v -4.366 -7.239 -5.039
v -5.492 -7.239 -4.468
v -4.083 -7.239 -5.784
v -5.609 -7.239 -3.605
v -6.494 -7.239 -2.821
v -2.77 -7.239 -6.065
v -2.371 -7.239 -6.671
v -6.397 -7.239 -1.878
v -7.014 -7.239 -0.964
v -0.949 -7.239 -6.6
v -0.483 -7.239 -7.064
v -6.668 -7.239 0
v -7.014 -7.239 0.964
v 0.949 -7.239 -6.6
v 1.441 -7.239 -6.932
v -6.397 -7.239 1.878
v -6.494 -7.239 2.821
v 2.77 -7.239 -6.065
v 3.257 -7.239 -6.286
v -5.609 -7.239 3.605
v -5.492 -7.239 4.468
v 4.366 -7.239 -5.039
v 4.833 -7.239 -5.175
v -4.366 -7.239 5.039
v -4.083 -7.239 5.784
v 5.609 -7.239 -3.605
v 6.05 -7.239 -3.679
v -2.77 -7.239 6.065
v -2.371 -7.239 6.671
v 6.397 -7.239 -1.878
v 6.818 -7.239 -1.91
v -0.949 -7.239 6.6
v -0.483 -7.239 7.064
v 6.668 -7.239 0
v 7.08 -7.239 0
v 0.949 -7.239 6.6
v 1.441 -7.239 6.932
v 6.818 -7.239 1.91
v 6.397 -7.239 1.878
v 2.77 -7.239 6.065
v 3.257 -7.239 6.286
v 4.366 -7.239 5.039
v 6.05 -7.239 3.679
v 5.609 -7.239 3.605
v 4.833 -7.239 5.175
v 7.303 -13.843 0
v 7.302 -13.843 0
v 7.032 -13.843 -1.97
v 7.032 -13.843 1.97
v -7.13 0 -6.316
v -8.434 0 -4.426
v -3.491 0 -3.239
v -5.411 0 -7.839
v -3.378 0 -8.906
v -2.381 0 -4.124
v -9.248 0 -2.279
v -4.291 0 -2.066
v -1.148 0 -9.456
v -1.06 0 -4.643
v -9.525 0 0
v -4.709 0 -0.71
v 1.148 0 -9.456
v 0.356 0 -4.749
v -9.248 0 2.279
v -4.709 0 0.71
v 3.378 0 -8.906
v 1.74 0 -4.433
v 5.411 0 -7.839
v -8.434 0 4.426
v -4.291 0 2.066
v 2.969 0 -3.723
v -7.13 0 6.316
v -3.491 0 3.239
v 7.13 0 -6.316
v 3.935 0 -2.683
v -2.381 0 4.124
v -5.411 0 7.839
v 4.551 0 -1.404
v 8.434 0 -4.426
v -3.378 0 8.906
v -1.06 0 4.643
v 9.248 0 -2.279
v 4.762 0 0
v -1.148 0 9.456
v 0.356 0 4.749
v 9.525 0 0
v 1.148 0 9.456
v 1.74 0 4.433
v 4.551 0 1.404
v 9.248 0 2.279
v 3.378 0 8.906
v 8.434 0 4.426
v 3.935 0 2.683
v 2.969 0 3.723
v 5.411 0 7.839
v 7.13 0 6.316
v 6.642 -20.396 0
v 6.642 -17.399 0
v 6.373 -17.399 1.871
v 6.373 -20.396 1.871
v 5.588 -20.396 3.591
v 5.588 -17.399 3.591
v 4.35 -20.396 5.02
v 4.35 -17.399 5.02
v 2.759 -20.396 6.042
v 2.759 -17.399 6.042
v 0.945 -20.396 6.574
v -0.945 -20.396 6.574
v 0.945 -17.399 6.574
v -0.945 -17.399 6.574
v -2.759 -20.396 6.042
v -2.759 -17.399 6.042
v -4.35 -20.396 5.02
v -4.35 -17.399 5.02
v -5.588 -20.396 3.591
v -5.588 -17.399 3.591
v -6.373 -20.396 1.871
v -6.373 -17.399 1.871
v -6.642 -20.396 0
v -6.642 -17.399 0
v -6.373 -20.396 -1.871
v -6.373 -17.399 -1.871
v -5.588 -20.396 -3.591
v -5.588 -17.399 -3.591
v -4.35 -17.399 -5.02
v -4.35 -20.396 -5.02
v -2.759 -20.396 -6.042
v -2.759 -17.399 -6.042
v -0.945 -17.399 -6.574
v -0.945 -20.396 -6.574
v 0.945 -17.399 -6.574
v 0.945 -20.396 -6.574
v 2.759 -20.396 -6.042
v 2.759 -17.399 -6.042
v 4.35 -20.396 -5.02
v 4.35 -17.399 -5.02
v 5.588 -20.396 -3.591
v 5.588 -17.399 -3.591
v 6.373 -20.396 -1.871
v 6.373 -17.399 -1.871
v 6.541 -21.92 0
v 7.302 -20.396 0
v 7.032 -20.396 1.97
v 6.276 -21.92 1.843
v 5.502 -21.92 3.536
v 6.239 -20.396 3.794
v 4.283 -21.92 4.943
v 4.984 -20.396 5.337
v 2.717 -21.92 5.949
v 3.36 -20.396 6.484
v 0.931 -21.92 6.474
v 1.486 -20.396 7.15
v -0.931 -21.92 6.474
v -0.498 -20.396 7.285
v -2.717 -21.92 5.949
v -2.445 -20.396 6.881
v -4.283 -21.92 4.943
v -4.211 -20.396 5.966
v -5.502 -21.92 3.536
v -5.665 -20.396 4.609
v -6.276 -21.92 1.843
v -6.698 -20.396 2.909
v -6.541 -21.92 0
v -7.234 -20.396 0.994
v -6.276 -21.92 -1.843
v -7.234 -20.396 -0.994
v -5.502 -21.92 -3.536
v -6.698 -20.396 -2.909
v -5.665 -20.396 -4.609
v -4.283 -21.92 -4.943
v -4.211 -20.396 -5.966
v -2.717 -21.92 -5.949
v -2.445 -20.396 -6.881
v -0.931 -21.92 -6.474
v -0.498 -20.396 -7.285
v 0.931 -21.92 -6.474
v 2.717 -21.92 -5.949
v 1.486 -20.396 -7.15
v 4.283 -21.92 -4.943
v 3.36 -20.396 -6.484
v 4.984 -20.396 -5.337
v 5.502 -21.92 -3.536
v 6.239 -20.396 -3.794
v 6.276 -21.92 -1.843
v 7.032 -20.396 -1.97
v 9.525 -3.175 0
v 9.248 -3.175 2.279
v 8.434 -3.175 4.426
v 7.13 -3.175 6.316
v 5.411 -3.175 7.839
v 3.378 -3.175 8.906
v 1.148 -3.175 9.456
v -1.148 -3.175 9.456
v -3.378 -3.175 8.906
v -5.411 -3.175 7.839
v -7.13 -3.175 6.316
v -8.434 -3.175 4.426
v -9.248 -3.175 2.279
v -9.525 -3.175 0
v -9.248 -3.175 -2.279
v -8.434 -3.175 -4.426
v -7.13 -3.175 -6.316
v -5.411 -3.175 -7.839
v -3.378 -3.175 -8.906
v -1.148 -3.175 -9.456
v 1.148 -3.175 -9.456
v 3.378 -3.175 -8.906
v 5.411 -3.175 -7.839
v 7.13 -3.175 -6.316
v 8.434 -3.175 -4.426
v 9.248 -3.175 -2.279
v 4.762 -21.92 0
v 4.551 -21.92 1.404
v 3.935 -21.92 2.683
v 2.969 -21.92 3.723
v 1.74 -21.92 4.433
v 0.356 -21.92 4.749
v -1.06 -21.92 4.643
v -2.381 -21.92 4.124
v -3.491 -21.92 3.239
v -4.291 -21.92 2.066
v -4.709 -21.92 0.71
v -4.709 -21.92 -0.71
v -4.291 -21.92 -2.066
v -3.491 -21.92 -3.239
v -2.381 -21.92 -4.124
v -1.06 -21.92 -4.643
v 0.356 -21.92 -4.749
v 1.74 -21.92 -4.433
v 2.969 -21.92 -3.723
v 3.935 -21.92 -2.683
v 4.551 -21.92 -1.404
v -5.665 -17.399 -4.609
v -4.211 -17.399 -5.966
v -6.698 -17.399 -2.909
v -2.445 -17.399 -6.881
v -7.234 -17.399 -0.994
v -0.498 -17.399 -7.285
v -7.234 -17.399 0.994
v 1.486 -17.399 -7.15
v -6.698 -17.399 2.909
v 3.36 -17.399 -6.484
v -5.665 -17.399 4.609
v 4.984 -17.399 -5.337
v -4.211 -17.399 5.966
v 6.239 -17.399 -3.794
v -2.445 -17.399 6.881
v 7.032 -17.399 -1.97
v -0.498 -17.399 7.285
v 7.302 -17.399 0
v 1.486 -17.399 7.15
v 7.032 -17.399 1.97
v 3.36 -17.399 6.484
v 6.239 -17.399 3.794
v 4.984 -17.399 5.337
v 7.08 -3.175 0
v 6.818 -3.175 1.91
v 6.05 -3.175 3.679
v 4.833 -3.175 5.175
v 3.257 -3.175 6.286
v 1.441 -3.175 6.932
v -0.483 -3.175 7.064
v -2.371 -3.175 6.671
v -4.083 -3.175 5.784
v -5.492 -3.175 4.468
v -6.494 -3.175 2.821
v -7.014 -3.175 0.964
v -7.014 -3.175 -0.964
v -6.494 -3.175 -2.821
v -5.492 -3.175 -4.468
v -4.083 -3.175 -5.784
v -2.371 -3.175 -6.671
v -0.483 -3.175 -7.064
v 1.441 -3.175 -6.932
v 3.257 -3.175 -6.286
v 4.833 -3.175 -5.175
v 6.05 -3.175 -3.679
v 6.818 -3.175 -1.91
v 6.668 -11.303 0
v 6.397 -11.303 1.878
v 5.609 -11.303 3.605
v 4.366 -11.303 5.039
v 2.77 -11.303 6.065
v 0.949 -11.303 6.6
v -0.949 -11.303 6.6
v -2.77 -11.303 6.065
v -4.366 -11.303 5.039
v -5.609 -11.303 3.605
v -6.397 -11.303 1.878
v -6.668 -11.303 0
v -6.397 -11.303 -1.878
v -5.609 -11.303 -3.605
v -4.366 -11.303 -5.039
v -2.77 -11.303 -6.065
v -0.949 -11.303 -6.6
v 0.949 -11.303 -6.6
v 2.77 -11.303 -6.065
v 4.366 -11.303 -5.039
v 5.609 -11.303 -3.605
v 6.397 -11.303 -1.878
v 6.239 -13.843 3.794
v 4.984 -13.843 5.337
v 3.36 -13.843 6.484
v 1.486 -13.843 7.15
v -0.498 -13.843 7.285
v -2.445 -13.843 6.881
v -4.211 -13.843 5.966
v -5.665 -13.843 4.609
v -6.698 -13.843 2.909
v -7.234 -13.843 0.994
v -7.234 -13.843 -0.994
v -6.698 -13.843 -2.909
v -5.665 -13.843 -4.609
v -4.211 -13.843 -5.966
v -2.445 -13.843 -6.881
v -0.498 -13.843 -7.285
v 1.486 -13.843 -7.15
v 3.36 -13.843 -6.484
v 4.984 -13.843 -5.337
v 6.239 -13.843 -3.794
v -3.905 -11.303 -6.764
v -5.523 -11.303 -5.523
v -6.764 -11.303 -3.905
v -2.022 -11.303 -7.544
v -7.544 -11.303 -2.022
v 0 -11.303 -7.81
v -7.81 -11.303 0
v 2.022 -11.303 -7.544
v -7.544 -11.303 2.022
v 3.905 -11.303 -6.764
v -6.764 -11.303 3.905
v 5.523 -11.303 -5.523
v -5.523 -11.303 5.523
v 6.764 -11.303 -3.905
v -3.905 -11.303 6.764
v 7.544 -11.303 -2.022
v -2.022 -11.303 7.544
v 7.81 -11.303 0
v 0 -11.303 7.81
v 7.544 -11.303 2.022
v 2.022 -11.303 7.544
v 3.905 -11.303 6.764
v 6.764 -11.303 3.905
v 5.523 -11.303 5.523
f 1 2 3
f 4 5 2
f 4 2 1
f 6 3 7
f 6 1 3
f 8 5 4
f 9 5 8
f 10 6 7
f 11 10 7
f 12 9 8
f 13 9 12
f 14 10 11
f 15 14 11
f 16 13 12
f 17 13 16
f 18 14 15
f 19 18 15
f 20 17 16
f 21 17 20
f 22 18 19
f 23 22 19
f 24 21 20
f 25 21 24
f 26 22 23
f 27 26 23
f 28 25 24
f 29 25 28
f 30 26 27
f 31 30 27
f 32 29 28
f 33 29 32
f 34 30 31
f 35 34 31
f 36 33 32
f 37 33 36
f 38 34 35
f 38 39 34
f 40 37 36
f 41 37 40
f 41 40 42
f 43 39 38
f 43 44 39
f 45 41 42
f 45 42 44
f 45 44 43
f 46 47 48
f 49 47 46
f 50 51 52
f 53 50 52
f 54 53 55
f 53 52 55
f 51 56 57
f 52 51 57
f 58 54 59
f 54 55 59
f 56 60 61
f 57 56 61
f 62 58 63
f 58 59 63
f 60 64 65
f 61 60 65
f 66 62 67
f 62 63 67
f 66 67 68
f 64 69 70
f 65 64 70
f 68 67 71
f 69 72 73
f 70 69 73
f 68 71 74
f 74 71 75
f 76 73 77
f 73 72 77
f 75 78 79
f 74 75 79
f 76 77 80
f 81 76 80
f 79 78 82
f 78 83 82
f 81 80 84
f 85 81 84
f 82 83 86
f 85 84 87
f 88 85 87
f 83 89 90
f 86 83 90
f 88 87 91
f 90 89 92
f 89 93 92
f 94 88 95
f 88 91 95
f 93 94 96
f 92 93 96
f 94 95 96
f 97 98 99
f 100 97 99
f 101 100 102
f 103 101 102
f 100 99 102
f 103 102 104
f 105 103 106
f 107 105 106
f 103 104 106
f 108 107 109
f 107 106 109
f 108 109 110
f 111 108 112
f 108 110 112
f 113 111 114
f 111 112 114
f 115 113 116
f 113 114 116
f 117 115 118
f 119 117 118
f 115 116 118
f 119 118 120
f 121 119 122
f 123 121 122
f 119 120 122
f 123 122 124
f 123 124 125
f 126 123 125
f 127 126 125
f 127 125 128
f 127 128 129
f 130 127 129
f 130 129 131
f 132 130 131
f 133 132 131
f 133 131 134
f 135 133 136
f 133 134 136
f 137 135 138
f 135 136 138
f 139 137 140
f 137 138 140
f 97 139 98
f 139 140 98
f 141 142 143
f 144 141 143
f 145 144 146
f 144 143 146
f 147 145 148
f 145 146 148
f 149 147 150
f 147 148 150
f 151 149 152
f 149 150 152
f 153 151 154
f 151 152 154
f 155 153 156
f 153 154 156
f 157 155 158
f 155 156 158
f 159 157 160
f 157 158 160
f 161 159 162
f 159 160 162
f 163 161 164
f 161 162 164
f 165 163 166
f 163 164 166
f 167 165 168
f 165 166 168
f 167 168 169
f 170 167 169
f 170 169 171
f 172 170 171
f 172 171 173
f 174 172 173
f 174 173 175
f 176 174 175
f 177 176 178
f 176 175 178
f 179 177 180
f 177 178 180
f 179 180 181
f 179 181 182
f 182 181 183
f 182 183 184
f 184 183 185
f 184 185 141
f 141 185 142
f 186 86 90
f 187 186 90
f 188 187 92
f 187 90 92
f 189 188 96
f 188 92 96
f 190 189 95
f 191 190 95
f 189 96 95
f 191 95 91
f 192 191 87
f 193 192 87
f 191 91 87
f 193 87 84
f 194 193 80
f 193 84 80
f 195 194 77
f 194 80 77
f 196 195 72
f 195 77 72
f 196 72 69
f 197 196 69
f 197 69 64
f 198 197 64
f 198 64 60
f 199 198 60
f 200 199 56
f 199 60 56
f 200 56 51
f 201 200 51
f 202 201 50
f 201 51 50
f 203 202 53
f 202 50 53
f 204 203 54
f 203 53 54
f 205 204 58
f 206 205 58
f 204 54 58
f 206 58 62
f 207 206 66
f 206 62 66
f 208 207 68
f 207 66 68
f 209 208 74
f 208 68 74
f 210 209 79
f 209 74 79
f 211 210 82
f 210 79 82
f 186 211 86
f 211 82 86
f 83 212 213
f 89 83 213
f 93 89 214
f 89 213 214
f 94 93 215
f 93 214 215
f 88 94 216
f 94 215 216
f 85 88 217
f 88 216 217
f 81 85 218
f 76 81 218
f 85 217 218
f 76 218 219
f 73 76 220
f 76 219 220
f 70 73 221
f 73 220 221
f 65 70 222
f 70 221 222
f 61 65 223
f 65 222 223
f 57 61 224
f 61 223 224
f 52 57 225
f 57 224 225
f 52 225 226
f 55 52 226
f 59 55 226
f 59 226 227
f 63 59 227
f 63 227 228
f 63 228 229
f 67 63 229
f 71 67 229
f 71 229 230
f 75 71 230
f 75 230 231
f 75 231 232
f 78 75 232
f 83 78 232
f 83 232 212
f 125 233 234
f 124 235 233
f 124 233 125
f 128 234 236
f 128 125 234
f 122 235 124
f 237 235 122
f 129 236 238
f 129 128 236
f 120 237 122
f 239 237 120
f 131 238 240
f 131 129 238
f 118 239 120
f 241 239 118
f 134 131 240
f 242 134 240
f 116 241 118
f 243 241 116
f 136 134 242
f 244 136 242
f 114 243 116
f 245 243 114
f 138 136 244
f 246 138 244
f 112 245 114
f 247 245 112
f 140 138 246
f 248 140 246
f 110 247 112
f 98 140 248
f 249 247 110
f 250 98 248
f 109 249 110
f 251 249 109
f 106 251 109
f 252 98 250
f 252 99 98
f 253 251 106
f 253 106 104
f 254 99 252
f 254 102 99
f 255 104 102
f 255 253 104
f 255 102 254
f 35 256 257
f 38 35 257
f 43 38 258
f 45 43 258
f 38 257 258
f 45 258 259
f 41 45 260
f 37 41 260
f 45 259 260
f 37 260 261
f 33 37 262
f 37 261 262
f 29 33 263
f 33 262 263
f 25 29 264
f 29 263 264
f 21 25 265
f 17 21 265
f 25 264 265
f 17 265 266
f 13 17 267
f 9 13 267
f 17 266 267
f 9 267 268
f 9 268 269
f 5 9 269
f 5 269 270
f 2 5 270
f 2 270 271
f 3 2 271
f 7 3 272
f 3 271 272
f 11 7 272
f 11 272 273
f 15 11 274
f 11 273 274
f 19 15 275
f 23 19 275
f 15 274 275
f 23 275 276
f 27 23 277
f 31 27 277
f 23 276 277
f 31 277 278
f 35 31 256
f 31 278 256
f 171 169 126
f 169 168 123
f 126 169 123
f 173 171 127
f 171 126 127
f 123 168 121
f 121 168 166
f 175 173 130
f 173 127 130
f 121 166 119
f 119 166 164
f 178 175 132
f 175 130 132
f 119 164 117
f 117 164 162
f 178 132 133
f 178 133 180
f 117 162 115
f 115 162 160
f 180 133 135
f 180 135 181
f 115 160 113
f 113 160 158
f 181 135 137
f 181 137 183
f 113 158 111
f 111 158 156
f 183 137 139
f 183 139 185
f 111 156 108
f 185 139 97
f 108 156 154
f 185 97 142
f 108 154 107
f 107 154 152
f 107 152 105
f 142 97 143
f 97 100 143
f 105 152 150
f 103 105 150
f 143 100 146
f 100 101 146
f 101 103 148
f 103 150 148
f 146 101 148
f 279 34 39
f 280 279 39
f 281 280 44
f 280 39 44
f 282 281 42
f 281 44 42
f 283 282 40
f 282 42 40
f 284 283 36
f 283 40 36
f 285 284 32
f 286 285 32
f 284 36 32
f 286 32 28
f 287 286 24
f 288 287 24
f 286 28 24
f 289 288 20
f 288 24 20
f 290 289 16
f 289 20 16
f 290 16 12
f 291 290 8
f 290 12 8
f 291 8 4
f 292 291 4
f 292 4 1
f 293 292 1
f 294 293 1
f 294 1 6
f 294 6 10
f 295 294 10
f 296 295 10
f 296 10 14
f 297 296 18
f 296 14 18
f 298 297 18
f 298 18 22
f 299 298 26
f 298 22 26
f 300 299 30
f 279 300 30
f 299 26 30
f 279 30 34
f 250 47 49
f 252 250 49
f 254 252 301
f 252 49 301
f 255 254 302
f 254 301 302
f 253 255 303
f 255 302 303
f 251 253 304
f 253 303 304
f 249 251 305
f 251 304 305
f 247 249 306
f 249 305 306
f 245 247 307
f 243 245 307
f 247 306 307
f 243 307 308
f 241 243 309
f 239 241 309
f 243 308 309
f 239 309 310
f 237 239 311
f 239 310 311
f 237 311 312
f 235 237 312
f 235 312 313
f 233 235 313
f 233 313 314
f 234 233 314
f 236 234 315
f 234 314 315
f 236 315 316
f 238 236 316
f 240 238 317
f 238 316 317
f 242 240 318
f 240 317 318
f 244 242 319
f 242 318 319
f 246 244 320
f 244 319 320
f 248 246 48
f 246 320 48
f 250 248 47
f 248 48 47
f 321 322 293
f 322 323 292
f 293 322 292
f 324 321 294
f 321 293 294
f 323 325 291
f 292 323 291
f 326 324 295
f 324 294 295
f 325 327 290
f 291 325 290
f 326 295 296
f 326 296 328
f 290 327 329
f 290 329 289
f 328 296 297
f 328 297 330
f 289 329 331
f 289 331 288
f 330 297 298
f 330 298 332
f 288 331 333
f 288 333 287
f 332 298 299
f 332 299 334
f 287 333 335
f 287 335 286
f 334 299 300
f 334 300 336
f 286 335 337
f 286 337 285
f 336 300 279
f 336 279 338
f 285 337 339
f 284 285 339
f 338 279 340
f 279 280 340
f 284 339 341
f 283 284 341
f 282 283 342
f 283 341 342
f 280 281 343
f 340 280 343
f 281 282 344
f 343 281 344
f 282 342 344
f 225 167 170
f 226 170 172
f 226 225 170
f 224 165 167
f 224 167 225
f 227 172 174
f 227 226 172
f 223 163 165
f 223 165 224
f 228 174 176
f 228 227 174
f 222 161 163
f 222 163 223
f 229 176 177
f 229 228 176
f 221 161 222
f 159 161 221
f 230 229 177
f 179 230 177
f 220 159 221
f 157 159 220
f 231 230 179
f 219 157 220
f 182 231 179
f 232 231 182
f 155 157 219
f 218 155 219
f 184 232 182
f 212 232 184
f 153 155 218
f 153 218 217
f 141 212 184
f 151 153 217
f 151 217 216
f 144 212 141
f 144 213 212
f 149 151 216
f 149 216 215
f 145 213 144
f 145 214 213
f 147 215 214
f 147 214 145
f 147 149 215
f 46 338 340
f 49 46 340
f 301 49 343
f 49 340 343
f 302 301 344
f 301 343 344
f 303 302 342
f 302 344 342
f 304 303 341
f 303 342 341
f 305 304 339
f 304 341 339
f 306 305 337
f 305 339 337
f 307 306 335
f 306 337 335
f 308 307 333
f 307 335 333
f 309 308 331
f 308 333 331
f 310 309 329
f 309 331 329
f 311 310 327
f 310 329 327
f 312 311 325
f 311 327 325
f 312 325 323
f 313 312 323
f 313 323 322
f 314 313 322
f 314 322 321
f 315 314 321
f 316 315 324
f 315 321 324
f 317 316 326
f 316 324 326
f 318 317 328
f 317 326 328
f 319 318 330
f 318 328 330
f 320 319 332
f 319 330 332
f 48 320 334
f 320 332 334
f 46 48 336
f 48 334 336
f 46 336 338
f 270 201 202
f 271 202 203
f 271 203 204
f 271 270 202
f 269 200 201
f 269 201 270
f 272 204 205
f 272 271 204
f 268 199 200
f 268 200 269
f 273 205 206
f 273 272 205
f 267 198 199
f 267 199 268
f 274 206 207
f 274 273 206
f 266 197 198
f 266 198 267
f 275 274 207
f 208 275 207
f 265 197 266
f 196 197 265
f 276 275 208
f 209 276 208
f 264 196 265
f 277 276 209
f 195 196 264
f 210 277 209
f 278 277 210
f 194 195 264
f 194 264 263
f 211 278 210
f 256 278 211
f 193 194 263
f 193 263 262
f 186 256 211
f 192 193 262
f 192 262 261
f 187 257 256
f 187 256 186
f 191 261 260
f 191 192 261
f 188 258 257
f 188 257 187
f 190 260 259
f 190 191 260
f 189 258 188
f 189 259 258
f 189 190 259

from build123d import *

# Parameters (mm, degrees)
F0_R      = 9.525
F1_DEPTH  = 3.175
F2_R      = 7.08025
F3_DEPTH  = 4.064
F4_R      = 6.6675
F5_DEPTH  = 4.064
F6_R      = 7.8105
F7_DEPTH  = 2.54
F8_R      = 7.3025
F9_DEPTH  = 3.556
F10_R     = 6.6421
F11_DEPTH = 2.9972
F12_R     = 7.3025
F13_DEPTH = 1.524
F14_SIZE2 = 2.53999
F14_SIZE  = 0.50799
F15_SIZE2 = 1.52399
F15_SIZE  = 0.76199
F16_R     = 4.7625
F17_DEPTH = 21.9212


# Not quite as in the source:
# - a fillet or chamfer is up to 0.001 mm smaller than in the source, because OpenCascade refuses the exact size


with BuildPart() as f1:
    # F0 (on Front) → F1 (new body)
    with BuildSketch(Plane.XZ):
        Circle(F0_R)
    extrude(amount=F1_DEPTH)

    # F2 (on face) → F3 (join)
    with BuildSketch(Plane.XZ.offset(3.175)):
        Circle(F2_R)
    extrude(amount=F3_DEPTH)

    # F4 (on face) → F5 (join)
    with BuildSketch(Plane.XZ.offset(7.239)):
        Circle(F4_R)
    extrude(amount=F5_DEPTH)

    # F6 (on face) → F7 (join)
    with BuildSketch(Plane.XZ.offset(11.303)):
        Circle(F6_R)
    extrude(amount=F7_DEPTH)

    # F8 (on face) → F9 (join)
    with BuildSketch(Plane.XZ.offset(13.843)):
        Circle(F8_R)
    extrude(amount=F9_DEPTH)

    # F10 (on face) → F11 (join)
    with BuildSketch(Plane.XZ.offset(17.399)):
        Circle(F10_R)
    extrude(amount=F11_DEPTH)

    # F12 (on face) → F13 (join)
    with BuildSketch(Plane.XZ.offset(20.3962)):
        Circle(F12_R)
    extrude(amount=F13_DEPTH)

    # F14 (size 0.508 and 2.54 in the source; OpenCascade refuses exactly that, so slightly less here)
    f14_edges = [f1.edges().sort_by_distance(p)[0] for p in [
        (-7.8105, -13.843, 0),
    ]]
    f14_side = f1.faces().sort_by_distance((-7.589586, -13.843, 0))[0]
    chamfer(f14_edges, length=F14_SIZE, length2=F14_SIZE2, reference=f14_side)

    # F15 (size 0.762 and 1.524 in the source; OpenCascade refuses exactly that, so slightly less here)
    f15_edges = [f1.edges().sort_by_distance(p)[0] for p in [
        (-7.3025, -21.9202, 0),
    ]]
    f15_side = f1.faces().sort_by_distance((0, -21.9202, 0))[0]
    chamfer(f15_edges, length=F15_SIZE, length2=F15_SIZE2, reference=f15_side)

    # F16 (on face) → F17 (cut, through all)
    with BuildSketch(Plane.XZ.offset(21.9202)):
        Circle(F16_R)
    extrude(amount=-F17_DEPTH, mode=Mode.SUBTRACT)


solid = f1.part
